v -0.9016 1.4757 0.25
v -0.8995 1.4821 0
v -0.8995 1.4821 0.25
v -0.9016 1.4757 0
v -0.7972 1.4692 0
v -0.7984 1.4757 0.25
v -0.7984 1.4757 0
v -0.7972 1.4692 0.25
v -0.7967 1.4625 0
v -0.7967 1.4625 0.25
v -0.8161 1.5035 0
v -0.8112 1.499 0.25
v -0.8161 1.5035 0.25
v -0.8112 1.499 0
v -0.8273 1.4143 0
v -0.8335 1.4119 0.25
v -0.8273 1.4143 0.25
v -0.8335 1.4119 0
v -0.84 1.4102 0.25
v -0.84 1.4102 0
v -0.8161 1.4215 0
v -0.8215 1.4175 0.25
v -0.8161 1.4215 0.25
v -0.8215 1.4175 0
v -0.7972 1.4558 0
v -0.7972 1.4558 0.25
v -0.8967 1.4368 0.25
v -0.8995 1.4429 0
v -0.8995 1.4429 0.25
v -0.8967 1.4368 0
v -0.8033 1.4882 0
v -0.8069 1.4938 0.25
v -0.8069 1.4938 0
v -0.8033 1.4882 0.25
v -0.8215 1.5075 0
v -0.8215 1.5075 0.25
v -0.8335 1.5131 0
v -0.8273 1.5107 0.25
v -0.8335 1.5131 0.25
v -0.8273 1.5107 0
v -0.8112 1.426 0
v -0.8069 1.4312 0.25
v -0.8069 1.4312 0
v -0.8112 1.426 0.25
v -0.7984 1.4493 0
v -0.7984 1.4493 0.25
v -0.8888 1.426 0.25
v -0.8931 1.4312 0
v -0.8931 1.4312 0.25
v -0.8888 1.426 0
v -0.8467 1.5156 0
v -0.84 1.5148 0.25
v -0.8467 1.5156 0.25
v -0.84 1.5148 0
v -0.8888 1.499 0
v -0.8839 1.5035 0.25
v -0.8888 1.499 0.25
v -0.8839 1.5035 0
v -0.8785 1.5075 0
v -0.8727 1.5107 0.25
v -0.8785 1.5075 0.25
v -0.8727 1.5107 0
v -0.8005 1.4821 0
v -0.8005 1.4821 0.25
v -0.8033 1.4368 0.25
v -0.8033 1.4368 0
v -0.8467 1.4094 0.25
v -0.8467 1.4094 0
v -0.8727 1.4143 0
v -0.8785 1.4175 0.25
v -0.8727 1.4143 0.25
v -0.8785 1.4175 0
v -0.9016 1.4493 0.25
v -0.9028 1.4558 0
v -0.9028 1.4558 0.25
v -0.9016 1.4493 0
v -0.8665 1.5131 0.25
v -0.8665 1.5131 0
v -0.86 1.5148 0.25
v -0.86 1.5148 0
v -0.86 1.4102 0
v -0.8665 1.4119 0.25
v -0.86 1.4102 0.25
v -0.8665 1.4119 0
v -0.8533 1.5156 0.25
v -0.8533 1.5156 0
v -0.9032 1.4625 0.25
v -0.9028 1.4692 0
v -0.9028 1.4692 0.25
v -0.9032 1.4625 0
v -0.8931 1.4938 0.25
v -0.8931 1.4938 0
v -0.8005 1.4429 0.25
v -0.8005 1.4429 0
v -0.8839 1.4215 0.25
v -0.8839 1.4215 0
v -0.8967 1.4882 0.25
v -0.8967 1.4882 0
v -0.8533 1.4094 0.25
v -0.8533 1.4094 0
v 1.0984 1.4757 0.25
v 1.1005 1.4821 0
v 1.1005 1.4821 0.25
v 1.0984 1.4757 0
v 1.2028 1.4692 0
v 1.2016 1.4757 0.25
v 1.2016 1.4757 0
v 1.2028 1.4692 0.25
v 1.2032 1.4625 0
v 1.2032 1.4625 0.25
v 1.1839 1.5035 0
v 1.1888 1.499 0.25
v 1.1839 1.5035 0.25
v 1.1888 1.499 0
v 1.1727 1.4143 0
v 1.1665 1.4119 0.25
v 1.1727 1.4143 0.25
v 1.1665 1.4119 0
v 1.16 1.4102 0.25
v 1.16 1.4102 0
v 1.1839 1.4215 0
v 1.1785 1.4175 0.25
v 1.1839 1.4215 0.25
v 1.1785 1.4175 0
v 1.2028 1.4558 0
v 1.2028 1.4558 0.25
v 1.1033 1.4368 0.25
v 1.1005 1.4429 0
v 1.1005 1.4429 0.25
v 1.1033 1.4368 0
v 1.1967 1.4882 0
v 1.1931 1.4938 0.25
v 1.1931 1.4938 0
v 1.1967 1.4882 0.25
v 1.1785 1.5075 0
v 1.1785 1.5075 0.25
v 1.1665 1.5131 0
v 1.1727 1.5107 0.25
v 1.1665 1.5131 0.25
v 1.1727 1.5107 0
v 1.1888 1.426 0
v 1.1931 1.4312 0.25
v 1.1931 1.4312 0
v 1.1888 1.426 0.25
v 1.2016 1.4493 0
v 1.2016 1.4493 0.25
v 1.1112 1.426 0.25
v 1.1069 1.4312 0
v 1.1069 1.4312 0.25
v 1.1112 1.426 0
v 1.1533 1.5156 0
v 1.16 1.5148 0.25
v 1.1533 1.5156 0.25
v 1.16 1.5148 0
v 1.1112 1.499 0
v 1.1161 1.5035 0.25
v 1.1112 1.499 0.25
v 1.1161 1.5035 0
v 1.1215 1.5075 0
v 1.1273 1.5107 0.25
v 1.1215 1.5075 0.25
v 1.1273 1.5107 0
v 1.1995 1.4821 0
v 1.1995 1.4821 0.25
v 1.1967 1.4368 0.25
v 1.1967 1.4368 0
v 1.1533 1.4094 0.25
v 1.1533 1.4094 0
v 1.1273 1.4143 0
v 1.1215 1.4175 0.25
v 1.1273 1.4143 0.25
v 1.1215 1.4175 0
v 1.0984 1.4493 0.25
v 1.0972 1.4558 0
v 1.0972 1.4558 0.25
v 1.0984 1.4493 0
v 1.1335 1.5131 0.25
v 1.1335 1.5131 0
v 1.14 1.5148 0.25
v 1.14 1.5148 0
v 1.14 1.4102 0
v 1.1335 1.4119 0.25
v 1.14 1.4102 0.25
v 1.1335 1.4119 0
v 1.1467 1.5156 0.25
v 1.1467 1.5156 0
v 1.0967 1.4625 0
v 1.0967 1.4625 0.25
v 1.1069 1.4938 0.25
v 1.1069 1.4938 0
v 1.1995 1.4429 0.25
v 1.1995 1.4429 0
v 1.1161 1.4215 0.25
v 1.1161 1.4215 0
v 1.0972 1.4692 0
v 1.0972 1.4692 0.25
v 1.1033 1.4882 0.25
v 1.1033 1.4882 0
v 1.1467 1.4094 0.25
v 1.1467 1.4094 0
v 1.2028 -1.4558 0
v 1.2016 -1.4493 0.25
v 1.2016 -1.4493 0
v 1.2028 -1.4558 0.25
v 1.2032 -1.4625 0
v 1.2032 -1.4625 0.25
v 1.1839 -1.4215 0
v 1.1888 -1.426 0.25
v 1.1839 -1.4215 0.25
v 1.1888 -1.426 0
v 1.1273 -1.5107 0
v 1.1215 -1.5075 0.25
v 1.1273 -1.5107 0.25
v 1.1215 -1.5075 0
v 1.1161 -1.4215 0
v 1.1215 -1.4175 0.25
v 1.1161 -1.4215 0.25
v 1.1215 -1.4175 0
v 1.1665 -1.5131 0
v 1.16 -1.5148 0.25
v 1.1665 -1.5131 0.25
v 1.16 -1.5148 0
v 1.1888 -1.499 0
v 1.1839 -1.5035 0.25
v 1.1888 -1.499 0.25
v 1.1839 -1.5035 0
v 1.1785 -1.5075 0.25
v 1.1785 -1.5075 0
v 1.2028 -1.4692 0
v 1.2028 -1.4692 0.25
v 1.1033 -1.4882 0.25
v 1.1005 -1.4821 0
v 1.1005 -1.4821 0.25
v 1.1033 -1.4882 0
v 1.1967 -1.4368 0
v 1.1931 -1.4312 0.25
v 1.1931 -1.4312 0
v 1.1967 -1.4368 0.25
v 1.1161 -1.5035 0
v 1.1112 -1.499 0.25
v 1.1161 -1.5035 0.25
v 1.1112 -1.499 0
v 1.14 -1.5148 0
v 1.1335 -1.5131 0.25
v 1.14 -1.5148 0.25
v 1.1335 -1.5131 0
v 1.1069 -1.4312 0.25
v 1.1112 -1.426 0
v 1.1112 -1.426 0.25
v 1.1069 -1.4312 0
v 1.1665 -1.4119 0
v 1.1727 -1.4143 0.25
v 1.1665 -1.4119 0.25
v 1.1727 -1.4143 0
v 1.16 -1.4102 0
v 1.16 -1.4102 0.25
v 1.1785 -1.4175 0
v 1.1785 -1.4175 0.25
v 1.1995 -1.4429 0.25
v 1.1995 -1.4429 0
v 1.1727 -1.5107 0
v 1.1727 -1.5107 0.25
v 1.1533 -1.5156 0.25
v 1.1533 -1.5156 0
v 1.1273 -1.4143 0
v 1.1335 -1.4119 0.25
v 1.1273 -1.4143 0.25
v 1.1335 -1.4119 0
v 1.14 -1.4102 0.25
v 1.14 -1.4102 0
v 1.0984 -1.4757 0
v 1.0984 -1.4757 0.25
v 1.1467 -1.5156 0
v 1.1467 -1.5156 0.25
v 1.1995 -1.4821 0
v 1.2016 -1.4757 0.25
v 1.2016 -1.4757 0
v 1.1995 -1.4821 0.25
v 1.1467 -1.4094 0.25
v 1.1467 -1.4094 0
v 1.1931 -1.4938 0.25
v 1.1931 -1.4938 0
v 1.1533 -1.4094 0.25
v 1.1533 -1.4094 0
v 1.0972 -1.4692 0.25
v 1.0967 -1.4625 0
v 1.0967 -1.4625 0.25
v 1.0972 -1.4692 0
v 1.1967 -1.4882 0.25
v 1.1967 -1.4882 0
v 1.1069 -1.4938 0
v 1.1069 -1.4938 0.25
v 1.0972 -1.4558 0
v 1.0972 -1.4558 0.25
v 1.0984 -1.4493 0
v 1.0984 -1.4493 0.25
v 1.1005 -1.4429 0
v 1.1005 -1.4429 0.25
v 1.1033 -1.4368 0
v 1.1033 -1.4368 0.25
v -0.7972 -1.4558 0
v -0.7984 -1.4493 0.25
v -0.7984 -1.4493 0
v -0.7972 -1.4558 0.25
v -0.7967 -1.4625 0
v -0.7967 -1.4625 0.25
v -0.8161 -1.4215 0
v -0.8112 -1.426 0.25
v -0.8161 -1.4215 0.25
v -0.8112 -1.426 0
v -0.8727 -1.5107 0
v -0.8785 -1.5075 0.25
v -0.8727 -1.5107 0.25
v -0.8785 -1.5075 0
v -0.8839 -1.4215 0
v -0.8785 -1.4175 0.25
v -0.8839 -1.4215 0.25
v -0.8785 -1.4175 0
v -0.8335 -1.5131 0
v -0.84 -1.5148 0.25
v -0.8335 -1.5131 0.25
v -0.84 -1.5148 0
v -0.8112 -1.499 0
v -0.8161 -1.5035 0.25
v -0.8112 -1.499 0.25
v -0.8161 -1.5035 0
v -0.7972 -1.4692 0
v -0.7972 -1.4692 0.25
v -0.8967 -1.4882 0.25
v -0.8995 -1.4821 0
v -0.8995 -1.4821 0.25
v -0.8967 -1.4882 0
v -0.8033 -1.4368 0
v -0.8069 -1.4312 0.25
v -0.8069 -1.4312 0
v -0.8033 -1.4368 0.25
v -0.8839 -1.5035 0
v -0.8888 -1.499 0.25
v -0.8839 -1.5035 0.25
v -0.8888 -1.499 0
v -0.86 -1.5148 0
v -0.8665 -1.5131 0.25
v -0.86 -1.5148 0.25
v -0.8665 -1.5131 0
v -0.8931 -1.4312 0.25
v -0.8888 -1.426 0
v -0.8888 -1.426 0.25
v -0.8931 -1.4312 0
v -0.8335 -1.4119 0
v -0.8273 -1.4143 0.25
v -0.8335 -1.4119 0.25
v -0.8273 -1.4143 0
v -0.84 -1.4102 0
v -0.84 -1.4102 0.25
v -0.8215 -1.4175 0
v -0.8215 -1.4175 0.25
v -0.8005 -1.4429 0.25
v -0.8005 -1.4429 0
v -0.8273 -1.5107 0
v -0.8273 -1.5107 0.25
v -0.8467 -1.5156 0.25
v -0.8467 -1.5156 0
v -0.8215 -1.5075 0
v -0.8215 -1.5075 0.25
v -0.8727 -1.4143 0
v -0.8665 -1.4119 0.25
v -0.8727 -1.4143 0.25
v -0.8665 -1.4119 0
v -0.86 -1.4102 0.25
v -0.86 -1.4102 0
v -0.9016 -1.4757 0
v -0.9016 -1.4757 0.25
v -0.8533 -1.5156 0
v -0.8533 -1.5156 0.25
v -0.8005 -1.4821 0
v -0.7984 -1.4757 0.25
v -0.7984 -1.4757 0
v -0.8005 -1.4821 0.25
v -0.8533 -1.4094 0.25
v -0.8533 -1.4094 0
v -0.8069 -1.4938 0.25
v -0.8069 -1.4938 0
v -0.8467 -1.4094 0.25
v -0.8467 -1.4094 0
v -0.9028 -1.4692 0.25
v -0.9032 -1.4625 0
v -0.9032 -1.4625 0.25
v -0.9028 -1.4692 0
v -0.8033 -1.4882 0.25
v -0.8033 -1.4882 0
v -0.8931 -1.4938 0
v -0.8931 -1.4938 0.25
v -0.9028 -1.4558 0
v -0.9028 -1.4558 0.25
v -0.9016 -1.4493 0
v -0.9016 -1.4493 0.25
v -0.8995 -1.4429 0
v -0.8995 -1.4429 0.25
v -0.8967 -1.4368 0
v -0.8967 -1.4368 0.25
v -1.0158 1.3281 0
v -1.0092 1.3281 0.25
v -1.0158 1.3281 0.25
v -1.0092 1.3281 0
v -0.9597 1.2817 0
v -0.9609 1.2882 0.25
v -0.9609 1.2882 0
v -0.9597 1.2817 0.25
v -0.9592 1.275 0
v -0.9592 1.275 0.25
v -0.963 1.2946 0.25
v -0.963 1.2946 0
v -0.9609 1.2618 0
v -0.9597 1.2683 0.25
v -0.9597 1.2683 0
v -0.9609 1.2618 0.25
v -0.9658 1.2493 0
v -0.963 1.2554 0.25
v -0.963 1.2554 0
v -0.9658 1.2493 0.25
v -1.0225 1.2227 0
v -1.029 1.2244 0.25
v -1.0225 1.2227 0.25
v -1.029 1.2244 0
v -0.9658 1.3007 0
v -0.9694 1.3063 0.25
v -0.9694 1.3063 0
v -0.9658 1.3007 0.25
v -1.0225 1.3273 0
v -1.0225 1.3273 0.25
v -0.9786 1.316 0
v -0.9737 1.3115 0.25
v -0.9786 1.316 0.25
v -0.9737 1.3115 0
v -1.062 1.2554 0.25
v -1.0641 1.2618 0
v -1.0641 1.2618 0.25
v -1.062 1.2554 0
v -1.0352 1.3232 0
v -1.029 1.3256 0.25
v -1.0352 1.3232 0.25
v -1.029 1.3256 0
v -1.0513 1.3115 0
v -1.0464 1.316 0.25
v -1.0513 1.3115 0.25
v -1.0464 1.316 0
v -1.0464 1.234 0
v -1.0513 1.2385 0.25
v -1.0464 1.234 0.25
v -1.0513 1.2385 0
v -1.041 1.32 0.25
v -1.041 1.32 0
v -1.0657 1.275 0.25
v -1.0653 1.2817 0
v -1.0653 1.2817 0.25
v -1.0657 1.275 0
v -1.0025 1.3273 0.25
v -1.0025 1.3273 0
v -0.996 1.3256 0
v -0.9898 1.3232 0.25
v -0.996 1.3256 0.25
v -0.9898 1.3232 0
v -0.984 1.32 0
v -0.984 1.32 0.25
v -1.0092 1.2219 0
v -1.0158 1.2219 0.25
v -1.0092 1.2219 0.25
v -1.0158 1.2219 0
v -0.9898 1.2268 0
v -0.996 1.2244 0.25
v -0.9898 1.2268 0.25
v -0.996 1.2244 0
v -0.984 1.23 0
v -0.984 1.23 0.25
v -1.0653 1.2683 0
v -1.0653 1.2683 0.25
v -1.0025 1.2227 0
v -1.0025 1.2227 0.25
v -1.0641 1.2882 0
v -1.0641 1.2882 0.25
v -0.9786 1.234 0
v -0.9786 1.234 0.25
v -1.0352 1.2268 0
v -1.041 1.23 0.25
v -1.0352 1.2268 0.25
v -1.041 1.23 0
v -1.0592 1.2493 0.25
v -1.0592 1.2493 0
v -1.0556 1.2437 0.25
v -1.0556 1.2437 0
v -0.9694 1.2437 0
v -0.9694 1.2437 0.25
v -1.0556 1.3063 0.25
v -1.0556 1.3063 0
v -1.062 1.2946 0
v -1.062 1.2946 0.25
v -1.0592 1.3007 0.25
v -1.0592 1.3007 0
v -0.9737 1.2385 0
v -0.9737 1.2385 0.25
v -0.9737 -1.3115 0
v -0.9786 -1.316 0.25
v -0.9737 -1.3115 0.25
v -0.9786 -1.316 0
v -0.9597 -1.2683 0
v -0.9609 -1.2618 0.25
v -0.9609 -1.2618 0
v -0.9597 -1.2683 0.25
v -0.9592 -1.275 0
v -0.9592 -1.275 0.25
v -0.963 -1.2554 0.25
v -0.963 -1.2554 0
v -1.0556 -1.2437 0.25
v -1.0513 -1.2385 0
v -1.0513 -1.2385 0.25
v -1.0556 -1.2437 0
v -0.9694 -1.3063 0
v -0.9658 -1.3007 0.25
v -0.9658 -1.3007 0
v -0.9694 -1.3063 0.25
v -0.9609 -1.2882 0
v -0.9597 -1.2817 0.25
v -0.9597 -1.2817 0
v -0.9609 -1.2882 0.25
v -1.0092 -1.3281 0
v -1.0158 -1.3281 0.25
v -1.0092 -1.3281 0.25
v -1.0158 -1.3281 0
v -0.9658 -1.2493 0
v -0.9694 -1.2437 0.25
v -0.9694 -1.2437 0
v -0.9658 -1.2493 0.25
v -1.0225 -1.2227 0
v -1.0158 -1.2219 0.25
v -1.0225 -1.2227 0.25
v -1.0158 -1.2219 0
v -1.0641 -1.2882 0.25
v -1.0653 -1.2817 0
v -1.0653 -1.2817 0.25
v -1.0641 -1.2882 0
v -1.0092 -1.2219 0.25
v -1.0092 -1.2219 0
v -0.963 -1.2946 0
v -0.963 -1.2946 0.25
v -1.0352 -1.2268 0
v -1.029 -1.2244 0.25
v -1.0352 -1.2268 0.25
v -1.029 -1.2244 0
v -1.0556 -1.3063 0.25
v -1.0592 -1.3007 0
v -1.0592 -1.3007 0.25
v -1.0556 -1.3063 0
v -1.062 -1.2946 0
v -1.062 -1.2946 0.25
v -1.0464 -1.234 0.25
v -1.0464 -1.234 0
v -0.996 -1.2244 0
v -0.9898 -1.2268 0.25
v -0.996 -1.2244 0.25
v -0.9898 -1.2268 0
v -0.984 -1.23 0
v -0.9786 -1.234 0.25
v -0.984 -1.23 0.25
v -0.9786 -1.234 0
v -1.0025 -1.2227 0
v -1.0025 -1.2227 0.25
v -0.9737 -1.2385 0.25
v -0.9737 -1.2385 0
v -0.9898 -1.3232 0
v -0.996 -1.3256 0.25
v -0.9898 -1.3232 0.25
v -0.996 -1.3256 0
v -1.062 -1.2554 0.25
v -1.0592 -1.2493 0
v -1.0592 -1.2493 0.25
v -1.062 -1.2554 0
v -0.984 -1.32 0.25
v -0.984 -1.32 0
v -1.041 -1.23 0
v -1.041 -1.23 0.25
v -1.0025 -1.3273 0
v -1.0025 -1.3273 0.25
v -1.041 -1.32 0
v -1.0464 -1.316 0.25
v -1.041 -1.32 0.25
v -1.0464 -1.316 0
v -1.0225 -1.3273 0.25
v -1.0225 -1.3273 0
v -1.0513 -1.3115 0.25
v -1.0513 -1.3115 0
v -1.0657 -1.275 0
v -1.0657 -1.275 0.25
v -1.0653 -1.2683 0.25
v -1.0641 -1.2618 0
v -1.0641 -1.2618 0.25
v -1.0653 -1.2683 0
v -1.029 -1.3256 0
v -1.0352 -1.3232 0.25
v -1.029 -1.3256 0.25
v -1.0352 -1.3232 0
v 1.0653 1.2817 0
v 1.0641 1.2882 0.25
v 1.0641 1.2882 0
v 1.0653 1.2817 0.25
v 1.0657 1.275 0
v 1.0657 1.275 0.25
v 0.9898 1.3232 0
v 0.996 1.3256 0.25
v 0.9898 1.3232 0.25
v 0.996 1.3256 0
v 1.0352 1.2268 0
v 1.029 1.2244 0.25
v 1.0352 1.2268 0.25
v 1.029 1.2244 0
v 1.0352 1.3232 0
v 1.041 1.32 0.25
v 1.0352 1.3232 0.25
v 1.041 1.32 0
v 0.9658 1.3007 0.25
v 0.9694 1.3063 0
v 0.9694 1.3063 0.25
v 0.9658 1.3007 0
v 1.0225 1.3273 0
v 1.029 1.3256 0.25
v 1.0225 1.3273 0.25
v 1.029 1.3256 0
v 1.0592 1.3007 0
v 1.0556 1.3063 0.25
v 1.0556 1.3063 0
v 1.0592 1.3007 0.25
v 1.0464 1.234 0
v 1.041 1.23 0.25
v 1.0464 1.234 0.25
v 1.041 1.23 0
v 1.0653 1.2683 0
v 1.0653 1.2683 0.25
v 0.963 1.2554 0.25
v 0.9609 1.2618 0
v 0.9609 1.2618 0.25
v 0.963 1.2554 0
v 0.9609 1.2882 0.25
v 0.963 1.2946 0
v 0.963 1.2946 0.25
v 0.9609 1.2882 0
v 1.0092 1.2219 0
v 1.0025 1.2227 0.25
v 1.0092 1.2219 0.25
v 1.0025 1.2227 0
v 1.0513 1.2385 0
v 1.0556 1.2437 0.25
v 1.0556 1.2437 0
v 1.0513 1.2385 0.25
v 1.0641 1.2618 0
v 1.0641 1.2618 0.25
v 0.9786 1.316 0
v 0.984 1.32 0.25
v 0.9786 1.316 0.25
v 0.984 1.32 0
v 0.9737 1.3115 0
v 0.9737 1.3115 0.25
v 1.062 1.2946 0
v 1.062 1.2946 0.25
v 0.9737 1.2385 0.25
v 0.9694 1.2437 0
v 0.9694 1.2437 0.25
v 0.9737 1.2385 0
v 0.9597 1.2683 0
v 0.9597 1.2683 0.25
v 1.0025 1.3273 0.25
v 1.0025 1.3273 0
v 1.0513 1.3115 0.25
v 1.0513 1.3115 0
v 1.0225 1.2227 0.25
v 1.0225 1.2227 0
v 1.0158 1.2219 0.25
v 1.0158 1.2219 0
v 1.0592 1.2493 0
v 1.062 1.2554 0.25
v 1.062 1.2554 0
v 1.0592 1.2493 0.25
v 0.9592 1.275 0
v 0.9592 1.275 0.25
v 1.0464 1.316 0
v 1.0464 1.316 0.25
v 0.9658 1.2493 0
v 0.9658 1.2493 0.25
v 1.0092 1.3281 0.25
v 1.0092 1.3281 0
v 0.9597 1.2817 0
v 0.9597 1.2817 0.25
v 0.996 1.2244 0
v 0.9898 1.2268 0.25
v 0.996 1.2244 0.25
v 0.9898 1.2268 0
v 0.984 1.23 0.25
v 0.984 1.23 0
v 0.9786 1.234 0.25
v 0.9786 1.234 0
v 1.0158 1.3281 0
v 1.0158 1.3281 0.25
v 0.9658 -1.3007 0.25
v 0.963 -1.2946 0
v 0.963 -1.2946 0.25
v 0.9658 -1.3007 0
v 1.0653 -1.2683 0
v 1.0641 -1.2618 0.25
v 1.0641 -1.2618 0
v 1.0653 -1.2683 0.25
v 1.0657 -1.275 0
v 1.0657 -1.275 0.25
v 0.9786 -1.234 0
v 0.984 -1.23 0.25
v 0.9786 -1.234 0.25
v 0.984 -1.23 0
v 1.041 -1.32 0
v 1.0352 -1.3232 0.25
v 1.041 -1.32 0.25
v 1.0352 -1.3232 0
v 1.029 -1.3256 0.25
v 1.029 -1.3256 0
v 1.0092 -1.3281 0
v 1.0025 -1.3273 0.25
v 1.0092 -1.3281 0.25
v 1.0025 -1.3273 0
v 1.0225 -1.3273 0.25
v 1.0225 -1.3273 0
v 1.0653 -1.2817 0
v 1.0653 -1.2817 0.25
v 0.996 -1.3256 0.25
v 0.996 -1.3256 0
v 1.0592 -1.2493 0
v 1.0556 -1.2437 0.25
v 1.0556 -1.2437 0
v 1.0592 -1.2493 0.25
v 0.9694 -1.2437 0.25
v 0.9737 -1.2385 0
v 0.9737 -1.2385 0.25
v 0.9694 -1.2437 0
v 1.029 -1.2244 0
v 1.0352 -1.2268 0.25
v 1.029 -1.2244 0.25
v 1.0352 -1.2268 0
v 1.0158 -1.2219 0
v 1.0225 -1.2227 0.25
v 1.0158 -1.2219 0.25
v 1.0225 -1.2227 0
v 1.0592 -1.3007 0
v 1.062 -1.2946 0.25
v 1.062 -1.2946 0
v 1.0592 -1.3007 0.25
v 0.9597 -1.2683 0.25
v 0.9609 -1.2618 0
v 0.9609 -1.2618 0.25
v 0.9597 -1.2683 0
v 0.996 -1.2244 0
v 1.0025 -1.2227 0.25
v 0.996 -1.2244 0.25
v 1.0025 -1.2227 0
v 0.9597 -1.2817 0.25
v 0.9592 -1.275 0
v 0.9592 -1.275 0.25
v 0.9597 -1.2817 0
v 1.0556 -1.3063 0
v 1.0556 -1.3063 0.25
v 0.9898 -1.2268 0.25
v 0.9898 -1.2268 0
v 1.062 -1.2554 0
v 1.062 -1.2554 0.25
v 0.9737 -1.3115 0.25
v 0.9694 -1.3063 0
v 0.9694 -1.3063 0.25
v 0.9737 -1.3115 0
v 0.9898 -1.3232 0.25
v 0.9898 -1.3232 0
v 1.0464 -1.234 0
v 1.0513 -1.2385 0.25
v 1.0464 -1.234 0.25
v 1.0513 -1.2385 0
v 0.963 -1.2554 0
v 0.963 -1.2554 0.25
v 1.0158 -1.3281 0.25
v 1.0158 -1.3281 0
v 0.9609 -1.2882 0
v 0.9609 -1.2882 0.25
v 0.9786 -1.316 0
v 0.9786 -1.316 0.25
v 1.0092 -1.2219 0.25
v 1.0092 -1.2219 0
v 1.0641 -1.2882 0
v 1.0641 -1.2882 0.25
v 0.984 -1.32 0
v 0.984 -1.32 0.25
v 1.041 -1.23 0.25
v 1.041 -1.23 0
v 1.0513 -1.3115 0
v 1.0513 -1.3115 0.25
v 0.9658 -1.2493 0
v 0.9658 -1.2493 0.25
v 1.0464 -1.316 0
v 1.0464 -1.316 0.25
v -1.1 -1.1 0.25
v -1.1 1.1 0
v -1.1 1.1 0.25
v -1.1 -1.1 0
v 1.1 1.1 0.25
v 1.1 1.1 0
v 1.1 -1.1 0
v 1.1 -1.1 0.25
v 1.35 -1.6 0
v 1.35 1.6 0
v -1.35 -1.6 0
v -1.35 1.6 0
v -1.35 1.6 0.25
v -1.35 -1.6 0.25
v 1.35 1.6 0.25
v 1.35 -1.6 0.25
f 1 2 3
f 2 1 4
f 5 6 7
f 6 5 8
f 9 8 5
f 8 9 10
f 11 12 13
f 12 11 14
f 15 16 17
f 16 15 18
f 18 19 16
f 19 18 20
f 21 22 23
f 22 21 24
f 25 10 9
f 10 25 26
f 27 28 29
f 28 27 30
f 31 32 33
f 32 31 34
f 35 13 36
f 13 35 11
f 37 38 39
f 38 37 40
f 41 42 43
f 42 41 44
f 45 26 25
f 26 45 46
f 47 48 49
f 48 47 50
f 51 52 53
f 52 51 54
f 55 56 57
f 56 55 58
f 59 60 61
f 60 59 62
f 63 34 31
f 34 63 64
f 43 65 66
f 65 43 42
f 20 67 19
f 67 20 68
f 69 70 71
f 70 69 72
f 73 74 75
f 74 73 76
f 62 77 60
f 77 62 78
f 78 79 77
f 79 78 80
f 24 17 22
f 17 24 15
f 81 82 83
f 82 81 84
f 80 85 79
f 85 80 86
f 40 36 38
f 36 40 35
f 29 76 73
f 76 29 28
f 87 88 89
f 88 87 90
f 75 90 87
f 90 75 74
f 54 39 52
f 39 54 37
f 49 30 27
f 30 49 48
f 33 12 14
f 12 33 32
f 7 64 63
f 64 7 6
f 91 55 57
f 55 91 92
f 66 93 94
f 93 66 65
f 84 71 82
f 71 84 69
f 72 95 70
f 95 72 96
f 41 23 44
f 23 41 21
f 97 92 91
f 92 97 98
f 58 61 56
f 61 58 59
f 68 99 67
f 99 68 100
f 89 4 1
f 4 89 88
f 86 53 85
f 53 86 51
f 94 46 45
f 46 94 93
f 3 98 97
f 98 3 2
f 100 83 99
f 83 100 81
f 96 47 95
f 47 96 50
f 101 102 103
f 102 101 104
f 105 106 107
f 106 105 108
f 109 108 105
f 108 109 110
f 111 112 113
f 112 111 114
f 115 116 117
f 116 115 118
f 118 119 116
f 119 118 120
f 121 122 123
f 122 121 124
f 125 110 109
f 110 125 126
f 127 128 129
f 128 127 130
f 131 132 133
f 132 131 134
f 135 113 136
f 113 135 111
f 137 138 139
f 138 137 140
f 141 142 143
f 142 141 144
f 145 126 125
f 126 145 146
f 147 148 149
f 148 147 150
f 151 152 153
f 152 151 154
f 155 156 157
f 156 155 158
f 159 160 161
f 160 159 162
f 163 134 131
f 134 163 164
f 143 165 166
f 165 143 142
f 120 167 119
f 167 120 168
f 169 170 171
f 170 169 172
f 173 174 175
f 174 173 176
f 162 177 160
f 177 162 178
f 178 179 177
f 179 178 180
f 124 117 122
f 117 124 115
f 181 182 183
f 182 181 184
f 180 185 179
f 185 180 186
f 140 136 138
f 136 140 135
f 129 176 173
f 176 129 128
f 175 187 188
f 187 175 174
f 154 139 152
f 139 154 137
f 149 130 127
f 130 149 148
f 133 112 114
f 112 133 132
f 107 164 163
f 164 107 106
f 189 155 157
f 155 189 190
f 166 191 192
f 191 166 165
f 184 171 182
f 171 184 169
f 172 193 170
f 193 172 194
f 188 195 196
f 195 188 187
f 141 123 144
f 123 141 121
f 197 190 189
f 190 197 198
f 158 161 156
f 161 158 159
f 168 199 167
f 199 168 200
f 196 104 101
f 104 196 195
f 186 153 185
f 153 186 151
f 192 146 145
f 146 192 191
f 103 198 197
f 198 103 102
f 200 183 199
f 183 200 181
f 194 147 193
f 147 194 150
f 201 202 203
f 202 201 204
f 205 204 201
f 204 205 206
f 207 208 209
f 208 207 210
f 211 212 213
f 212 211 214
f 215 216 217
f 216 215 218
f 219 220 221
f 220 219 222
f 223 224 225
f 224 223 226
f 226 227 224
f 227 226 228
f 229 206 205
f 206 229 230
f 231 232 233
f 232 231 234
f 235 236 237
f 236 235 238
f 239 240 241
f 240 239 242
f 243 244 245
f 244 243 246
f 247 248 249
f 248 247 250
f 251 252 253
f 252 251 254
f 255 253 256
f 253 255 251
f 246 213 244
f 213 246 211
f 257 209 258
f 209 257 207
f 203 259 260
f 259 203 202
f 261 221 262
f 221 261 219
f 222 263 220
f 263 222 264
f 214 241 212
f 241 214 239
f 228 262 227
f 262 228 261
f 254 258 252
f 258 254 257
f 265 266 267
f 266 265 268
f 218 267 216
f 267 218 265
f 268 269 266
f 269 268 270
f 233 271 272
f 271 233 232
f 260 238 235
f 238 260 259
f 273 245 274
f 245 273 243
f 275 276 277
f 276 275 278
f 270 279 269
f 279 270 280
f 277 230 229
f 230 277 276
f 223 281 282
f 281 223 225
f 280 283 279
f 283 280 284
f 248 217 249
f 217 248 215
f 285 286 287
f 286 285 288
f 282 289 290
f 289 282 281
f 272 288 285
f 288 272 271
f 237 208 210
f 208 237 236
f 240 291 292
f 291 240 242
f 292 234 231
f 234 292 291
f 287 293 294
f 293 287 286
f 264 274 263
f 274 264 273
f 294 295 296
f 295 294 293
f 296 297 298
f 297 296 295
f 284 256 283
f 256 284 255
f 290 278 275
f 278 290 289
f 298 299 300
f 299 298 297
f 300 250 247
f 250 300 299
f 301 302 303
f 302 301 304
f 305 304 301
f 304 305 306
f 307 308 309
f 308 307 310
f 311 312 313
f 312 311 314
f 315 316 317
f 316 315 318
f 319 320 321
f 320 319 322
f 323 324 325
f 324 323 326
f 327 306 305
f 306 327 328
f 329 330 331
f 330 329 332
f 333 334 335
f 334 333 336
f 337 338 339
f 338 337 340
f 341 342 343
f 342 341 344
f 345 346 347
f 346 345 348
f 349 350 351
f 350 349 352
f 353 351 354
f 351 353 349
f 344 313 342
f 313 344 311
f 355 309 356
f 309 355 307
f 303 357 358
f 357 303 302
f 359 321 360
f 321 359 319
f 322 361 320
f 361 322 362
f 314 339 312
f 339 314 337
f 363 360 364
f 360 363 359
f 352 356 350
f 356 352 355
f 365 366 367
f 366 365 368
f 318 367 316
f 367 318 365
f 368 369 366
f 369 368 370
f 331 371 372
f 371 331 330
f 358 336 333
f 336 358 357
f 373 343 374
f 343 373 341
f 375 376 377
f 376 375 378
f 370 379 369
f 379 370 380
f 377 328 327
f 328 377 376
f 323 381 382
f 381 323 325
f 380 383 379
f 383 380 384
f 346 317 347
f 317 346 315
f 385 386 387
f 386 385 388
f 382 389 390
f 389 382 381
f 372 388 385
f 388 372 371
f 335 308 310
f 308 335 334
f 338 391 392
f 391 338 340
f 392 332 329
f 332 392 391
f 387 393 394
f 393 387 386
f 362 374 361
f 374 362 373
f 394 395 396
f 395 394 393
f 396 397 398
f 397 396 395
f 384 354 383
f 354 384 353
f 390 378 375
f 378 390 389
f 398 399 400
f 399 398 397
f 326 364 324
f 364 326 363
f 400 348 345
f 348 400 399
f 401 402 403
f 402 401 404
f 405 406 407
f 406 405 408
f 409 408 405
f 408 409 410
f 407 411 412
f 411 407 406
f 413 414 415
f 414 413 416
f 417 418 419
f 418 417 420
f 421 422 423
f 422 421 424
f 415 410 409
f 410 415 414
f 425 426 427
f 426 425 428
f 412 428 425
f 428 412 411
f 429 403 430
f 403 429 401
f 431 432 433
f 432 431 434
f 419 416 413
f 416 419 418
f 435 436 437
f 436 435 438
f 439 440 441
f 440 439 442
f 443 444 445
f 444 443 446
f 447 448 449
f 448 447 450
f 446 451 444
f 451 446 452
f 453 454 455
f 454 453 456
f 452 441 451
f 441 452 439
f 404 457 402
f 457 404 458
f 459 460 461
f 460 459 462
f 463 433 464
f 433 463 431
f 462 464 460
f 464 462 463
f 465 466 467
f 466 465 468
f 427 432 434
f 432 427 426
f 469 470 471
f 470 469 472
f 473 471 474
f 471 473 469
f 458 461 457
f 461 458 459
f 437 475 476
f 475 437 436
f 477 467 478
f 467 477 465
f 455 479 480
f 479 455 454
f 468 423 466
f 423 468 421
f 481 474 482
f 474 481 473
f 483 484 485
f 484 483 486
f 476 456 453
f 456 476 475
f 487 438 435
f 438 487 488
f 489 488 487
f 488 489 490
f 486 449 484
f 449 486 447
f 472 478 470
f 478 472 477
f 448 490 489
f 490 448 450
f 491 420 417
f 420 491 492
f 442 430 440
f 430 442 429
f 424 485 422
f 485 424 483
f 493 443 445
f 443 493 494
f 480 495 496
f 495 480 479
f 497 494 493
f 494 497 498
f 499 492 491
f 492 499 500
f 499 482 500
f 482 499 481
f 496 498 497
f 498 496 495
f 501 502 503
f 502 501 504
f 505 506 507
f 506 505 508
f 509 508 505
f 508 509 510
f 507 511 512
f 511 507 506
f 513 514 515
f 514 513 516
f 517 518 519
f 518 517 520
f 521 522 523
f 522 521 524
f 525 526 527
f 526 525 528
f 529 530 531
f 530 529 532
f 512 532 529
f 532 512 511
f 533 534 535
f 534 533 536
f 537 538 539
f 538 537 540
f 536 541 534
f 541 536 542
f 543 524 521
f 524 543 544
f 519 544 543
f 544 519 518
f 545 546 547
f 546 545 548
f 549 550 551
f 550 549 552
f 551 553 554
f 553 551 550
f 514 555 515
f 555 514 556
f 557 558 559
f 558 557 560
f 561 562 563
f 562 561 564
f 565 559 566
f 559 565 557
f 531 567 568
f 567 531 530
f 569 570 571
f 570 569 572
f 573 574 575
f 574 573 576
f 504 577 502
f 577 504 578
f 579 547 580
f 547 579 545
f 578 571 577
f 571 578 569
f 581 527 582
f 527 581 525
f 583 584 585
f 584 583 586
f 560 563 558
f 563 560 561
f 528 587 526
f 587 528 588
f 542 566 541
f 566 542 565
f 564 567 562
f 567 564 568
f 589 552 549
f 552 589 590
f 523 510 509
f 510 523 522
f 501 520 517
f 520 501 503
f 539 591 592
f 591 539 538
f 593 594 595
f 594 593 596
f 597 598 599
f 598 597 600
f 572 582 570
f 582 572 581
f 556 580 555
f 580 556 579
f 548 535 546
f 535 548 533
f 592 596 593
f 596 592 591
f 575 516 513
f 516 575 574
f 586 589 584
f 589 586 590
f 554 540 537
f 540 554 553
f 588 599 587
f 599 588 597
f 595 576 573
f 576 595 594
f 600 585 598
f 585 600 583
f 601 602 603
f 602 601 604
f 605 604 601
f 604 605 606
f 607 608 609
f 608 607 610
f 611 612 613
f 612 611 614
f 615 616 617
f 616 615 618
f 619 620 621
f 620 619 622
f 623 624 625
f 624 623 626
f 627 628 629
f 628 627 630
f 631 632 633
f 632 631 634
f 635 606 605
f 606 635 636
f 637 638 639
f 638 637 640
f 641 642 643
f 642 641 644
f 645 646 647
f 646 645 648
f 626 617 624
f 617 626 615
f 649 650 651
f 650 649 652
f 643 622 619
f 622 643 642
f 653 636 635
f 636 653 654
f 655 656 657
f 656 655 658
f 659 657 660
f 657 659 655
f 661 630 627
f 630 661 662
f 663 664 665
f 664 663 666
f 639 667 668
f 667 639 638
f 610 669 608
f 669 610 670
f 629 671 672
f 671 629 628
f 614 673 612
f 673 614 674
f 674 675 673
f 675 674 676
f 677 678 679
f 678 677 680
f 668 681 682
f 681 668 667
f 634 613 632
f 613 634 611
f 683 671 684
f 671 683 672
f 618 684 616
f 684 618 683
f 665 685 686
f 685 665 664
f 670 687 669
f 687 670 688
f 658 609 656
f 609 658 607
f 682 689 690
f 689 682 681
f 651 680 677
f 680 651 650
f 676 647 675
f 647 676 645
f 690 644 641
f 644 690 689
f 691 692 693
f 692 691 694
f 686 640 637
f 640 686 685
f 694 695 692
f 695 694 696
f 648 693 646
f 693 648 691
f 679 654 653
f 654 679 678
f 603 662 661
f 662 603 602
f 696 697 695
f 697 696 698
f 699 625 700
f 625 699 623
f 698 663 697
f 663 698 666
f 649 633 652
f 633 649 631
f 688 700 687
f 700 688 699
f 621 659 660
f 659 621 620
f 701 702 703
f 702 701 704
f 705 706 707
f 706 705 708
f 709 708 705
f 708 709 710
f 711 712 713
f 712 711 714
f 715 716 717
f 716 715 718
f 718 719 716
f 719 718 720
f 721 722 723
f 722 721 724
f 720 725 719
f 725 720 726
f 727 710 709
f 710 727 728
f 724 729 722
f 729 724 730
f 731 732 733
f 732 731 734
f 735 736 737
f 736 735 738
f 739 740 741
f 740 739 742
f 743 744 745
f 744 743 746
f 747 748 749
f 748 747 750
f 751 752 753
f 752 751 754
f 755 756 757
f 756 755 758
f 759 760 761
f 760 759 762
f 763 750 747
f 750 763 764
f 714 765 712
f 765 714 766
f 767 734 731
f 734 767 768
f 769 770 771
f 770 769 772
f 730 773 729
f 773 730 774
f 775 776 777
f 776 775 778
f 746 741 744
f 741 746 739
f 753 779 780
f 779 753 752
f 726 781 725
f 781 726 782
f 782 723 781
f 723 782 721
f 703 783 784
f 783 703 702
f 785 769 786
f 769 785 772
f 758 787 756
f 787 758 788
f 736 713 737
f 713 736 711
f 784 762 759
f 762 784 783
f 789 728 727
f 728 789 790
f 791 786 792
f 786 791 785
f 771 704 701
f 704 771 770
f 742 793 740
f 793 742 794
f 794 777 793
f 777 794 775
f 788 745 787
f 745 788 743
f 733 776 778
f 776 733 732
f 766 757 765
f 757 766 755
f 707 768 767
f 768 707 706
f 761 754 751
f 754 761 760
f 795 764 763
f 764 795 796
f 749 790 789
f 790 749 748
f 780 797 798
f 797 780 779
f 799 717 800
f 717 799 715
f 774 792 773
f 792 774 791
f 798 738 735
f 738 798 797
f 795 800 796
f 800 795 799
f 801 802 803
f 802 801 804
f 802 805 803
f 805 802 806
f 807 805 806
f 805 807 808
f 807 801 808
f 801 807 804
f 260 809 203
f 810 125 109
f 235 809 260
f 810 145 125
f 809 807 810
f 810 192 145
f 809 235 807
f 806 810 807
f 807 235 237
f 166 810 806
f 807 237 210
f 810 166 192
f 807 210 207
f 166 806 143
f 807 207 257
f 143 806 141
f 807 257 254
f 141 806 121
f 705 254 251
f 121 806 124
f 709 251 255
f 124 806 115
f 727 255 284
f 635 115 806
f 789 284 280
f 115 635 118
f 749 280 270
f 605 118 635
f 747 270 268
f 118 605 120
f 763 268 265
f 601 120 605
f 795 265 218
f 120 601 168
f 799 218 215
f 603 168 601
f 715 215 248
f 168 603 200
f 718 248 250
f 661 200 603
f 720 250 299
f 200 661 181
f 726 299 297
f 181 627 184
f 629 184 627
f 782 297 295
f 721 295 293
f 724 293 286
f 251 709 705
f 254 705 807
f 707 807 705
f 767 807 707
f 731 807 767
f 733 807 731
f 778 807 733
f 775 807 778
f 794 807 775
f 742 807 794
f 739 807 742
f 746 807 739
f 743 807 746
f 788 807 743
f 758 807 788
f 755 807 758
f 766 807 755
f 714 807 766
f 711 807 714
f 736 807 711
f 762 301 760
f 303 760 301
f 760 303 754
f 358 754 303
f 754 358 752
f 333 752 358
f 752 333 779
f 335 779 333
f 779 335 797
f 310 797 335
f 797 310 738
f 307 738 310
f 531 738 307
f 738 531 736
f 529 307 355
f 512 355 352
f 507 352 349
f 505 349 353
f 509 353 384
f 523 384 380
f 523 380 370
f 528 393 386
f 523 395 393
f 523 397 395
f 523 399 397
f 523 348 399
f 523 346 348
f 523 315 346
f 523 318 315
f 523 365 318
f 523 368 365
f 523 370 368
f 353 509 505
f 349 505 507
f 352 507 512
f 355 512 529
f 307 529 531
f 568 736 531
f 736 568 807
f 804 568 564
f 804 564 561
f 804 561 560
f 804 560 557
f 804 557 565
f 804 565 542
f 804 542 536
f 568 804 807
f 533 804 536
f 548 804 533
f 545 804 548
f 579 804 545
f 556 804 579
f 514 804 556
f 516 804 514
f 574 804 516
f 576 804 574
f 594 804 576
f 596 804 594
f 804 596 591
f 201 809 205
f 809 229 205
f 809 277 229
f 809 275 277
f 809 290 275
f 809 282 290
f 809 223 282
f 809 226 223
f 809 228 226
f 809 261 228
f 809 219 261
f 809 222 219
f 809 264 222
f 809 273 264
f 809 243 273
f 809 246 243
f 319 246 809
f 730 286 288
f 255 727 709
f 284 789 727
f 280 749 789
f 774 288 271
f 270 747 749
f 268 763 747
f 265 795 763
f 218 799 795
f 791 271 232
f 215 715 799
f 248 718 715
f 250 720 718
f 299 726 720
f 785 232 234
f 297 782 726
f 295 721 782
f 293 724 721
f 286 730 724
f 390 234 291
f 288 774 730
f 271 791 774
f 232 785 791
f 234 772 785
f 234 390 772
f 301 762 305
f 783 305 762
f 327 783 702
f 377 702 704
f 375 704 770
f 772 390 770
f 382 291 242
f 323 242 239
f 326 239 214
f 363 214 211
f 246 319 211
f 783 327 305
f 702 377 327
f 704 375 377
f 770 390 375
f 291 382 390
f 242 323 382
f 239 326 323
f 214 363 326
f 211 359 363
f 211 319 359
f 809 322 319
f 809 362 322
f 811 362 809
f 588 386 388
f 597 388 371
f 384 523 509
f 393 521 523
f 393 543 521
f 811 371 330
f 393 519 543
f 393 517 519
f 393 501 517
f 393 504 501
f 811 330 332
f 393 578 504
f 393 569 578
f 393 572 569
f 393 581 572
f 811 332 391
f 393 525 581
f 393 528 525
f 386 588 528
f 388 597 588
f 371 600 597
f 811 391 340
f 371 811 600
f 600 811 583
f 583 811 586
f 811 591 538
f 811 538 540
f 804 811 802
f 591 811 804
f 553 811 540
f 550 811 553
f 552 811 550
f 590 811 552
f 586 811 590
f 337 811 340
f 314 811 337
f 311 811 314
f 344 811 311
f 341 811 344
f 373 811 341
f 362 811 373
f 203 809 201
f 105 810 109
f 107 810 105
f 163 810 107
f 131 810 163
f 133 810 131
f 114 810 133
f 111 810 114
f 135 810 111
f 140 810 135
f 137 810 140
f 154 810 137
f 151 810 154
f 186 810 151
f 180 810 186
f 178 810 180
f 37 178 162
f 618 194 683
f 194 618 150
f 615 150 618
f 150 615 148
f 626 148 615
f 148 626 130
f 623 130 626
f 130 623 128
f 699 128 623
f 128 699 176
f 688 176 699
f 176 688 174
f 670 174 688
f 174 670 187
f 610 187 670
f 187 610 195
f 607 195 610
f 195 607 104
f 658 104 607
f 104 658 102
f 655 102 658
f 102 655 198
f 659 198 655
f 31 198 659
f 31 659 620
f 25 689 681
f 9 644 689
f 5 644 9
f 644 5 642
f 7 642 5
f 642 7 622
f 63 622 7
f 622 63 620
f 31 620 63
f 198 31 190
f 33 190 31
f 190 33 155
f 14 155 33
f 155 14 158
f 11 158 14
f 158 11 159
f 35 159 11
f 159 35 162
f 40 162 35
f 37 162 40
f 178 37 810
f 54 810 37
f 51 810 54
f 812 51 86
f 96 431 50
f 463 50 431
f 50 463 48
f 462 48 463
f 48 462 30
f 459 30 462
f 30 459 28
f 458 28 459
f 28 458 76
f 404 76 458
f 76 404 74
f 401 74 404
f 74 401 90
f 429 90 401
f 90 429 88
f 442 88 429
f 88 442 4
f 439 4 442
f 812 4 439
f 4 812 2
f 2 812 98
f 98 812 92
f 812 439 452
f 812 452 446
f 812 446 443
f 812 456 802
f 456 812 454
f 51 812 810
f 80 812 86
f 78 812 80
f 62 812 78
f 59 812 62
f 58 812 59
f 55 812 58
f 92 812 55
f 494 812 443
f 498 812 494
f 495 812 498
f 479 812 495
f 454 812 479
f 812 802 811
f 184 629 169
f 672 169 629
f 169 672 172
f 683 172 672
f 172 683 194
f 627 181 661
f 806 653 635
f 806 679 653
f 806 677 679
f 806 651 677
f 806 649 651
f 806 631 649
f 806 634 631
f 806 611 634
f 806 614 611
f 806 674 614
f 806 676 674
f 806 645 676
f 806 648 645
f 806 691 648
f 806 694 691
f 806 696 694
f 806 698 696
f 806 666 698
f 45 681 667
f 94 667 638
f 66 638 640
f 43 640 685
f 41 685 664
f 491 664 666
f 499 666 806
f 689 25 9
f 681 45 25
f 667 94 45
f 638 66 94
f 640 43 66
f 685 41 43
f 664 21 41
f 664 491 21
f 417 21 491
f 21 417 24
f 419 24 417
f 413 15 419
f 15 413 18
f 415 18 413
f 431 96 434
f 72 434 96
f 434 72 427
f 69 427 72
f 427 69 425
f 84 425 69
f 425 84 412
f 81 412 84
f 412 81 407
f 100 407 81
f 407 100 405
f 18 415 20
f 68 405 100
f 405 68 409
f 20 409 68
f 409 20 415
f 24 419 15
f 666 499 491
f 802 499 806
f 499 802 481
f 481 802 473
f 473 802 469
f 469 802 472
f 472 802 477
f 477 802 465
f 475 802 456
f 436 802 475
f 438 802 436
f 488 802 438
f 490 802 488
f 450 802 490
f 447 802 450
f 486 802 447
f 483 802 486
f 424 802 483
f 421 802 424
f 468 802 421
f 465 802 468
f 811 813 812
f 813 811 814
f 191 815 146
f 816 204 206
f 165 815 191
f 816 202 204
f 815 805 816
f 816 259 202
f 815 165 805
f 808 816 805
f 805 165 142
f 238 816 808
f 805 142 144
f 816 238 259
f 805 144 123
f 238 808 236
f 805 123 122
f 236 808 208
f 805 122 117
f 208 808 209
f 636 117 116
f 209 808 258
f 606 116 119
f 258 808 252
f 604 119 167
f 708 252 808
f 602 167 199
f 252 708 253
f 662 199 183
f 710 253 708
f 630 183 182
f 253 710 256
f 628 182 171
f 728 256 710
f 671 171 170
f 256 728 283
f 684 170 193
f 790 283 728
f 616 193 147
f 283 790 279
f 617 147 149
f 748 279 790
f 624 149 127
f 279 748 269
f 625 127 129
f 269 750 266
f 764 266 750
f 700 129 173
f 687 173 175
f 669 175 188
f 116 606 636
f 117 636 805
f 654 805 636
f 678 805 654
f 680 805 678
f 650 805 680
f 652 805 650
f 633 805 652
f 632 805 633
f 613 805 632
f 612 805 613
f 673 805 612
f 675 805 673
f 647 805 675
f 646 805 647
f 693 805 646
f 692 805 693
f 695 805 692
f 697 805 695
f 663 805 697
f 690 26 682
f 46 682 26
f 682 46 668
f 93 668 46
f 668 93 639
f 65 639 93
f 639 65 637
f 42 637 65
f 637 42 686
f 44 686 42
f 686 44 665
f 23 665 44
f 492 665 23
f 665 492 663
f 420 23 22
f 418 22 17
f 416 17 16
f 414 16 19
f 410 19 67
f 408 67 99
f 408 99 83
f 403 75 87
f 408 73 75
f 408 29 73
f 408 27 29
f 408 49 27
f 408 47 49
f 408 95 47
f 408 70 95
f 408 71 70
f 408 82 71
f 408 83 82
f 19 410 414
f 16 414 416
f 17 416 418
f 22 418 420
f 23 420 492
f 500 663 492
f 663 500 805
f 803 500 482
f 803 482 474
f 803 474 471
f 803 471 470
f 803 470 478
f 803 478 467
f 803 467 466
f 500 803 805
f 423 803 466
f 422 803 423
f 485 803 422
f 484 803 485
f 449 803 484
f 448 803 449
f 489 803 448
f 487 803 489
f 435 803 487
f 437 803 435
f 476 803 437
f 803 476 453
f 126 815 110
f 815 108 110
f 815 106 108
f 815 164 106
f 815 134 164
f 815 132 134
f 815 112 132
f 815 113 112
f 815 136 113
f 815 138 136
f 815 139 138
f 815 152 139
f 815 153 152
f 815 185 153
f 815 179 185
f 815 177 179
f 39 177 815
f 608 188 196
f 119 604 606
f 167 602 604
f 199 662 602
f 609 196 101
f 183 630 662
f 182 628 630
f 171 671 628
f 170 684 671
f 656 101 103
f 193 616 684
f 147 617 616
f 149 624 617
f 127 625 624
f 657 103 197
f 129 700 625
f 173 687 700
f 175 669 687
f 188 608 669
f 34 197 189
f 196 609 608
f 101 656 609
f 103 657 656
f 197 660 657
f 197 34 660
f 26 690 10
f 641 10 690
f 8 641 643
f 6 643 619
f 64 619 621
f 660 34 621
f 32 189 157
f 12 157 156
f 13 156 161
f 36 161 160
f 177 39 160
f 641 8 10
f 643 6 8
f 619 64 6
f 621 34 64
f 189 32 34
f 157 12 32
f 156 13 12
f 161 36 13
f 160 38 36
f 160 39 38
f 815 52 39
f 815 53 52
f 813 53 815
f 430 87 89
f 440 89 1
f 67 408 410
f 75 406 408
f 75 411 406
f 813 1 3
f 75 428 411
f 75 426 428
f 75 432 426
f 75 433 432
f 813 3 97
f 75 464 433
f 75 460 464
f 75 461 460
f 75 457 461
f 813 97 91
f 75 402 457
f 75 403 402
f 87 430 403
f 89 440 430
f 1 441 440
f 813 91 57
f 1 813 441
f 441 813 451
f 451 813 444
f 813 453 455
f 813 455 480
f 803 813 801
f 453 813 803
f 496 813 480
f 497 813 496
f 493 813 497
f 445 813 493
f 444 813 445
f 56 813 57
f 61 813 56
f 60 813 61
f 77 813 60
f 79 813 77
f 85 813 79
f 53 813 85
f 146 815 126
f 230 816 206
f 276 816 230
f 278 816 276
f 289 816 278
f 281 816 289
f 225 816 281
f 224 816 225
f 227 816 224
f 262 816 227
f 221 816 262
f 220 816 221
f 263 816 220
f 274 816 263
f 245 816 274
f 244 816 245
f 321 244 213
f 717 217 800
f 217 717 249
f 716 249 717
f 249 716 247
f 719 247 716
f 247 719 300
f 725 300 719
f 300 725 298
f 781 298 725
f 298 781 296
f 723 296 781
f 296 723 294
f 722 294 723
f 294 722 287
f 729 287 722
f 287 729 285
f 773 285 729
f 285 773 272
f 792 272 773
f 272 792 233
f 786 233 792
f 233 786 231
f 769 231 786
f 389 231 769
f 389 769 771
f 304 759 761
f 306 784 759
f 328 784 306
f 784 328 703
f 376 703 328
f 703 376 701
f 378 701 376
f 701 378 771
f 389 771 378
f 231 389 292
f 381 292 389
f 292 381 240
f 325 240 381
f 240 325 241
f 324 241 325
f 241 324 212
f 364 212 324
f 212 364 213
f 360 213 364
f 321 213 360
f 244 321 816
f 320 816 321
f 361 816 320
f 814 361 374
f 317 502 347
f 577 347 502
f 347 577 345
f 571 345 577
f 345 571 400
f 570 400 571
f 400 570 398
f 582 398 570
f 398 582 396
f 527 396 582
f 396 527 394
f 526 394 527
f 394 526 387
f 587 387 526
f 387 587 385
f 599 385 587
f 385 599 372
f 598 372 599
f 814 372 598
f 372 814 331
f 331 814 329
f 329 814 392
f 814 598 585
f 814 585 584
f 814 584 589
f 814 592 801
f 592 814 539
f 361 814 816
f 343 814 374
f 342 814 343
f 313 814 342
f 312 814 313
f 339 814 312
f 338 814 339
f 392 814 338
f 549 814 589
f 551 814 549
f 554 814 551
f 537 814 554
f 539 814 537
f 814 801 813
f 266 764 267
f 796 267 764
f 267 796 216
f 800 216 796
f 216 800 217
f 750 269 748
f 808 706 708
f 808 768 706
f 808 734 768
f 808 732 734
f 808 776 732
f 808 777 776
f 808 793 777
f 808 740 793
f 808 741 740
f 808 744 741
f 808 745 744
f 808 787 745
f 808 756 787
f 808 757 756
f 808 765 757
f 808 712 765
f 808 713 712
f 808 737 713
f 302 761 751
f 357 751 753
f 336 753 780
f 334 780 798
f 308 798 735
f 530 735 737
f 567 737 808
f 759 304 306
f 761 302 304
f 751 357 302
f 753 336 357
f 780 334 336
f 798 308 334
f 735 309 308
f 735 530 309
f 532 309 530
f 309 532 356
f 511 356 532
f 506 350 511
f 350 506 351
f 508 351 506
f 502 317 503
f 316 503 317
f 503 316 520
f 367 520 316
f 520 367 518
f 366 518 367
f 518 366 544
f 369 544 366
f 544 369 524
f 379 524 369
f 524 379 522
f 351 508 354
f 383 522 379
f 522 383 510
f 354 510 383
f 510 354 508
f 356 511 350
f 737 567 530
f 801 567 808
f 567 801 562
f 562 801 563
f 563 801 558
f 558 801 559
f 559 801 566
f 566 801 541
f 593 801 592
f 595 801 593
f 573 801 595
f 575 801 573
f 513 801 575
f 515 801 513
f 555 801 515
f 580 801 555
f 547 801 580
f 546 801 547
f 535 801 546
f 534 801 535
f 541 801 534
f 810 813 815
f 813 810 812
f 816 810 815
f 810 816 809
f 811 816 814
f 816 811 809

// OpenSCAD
6_32 = 0.1065; // drill tap diameter
T_PLATE = .25;
CONTROL_OFFSET_X = .15;
CONTROL_OFFSET_Y = .0;

module hole(x, y, height, d) {
    translate([x, y, height/2])
        cylinder(h=2 * height,d=d,center=true,$fn=50);
}
difference() {
    linear_extrude(height = T_PLATE)
        square([2.7, 3.2], center = true);
    union() {
        
        // mounting holes for agc
        hole(-1.0125, 1.275, T_PLATE, 6_32);
        hole(-1.0125, -1.275, T_PLATE, 6_32);
        hole(+1.0125, 1.275, T_PLATE, 6_32);
        hole(+1.0125, -1.275, T_PLATE, 6_32);
        // exiting holes on plate
        translate([CONTROL_OFFSET_X, CONTROL_OFFSET_Y, 0]) {
            hole(-1, 1.4625, T_PLATE, 6_32);
            hole(+1, 1.4625, T_PLATE, 6_32);
            hole(+1, -1.4625, T_PLATE, 6_32);
            hole(-1, -1.4625, T_PLATE, 6_32);
        }
        
        // cutout unused space in middle
        translate([0,0,-.5])
            linear_extrude(height = 1)
                square([2.2, 2.2], center = true);

        };
        
        // todo: add cutout for regulator pins
}
   
//(11.725, 6.665), (13.725, 6.665), (11.725, 3.740), (13.725, 3.740)
